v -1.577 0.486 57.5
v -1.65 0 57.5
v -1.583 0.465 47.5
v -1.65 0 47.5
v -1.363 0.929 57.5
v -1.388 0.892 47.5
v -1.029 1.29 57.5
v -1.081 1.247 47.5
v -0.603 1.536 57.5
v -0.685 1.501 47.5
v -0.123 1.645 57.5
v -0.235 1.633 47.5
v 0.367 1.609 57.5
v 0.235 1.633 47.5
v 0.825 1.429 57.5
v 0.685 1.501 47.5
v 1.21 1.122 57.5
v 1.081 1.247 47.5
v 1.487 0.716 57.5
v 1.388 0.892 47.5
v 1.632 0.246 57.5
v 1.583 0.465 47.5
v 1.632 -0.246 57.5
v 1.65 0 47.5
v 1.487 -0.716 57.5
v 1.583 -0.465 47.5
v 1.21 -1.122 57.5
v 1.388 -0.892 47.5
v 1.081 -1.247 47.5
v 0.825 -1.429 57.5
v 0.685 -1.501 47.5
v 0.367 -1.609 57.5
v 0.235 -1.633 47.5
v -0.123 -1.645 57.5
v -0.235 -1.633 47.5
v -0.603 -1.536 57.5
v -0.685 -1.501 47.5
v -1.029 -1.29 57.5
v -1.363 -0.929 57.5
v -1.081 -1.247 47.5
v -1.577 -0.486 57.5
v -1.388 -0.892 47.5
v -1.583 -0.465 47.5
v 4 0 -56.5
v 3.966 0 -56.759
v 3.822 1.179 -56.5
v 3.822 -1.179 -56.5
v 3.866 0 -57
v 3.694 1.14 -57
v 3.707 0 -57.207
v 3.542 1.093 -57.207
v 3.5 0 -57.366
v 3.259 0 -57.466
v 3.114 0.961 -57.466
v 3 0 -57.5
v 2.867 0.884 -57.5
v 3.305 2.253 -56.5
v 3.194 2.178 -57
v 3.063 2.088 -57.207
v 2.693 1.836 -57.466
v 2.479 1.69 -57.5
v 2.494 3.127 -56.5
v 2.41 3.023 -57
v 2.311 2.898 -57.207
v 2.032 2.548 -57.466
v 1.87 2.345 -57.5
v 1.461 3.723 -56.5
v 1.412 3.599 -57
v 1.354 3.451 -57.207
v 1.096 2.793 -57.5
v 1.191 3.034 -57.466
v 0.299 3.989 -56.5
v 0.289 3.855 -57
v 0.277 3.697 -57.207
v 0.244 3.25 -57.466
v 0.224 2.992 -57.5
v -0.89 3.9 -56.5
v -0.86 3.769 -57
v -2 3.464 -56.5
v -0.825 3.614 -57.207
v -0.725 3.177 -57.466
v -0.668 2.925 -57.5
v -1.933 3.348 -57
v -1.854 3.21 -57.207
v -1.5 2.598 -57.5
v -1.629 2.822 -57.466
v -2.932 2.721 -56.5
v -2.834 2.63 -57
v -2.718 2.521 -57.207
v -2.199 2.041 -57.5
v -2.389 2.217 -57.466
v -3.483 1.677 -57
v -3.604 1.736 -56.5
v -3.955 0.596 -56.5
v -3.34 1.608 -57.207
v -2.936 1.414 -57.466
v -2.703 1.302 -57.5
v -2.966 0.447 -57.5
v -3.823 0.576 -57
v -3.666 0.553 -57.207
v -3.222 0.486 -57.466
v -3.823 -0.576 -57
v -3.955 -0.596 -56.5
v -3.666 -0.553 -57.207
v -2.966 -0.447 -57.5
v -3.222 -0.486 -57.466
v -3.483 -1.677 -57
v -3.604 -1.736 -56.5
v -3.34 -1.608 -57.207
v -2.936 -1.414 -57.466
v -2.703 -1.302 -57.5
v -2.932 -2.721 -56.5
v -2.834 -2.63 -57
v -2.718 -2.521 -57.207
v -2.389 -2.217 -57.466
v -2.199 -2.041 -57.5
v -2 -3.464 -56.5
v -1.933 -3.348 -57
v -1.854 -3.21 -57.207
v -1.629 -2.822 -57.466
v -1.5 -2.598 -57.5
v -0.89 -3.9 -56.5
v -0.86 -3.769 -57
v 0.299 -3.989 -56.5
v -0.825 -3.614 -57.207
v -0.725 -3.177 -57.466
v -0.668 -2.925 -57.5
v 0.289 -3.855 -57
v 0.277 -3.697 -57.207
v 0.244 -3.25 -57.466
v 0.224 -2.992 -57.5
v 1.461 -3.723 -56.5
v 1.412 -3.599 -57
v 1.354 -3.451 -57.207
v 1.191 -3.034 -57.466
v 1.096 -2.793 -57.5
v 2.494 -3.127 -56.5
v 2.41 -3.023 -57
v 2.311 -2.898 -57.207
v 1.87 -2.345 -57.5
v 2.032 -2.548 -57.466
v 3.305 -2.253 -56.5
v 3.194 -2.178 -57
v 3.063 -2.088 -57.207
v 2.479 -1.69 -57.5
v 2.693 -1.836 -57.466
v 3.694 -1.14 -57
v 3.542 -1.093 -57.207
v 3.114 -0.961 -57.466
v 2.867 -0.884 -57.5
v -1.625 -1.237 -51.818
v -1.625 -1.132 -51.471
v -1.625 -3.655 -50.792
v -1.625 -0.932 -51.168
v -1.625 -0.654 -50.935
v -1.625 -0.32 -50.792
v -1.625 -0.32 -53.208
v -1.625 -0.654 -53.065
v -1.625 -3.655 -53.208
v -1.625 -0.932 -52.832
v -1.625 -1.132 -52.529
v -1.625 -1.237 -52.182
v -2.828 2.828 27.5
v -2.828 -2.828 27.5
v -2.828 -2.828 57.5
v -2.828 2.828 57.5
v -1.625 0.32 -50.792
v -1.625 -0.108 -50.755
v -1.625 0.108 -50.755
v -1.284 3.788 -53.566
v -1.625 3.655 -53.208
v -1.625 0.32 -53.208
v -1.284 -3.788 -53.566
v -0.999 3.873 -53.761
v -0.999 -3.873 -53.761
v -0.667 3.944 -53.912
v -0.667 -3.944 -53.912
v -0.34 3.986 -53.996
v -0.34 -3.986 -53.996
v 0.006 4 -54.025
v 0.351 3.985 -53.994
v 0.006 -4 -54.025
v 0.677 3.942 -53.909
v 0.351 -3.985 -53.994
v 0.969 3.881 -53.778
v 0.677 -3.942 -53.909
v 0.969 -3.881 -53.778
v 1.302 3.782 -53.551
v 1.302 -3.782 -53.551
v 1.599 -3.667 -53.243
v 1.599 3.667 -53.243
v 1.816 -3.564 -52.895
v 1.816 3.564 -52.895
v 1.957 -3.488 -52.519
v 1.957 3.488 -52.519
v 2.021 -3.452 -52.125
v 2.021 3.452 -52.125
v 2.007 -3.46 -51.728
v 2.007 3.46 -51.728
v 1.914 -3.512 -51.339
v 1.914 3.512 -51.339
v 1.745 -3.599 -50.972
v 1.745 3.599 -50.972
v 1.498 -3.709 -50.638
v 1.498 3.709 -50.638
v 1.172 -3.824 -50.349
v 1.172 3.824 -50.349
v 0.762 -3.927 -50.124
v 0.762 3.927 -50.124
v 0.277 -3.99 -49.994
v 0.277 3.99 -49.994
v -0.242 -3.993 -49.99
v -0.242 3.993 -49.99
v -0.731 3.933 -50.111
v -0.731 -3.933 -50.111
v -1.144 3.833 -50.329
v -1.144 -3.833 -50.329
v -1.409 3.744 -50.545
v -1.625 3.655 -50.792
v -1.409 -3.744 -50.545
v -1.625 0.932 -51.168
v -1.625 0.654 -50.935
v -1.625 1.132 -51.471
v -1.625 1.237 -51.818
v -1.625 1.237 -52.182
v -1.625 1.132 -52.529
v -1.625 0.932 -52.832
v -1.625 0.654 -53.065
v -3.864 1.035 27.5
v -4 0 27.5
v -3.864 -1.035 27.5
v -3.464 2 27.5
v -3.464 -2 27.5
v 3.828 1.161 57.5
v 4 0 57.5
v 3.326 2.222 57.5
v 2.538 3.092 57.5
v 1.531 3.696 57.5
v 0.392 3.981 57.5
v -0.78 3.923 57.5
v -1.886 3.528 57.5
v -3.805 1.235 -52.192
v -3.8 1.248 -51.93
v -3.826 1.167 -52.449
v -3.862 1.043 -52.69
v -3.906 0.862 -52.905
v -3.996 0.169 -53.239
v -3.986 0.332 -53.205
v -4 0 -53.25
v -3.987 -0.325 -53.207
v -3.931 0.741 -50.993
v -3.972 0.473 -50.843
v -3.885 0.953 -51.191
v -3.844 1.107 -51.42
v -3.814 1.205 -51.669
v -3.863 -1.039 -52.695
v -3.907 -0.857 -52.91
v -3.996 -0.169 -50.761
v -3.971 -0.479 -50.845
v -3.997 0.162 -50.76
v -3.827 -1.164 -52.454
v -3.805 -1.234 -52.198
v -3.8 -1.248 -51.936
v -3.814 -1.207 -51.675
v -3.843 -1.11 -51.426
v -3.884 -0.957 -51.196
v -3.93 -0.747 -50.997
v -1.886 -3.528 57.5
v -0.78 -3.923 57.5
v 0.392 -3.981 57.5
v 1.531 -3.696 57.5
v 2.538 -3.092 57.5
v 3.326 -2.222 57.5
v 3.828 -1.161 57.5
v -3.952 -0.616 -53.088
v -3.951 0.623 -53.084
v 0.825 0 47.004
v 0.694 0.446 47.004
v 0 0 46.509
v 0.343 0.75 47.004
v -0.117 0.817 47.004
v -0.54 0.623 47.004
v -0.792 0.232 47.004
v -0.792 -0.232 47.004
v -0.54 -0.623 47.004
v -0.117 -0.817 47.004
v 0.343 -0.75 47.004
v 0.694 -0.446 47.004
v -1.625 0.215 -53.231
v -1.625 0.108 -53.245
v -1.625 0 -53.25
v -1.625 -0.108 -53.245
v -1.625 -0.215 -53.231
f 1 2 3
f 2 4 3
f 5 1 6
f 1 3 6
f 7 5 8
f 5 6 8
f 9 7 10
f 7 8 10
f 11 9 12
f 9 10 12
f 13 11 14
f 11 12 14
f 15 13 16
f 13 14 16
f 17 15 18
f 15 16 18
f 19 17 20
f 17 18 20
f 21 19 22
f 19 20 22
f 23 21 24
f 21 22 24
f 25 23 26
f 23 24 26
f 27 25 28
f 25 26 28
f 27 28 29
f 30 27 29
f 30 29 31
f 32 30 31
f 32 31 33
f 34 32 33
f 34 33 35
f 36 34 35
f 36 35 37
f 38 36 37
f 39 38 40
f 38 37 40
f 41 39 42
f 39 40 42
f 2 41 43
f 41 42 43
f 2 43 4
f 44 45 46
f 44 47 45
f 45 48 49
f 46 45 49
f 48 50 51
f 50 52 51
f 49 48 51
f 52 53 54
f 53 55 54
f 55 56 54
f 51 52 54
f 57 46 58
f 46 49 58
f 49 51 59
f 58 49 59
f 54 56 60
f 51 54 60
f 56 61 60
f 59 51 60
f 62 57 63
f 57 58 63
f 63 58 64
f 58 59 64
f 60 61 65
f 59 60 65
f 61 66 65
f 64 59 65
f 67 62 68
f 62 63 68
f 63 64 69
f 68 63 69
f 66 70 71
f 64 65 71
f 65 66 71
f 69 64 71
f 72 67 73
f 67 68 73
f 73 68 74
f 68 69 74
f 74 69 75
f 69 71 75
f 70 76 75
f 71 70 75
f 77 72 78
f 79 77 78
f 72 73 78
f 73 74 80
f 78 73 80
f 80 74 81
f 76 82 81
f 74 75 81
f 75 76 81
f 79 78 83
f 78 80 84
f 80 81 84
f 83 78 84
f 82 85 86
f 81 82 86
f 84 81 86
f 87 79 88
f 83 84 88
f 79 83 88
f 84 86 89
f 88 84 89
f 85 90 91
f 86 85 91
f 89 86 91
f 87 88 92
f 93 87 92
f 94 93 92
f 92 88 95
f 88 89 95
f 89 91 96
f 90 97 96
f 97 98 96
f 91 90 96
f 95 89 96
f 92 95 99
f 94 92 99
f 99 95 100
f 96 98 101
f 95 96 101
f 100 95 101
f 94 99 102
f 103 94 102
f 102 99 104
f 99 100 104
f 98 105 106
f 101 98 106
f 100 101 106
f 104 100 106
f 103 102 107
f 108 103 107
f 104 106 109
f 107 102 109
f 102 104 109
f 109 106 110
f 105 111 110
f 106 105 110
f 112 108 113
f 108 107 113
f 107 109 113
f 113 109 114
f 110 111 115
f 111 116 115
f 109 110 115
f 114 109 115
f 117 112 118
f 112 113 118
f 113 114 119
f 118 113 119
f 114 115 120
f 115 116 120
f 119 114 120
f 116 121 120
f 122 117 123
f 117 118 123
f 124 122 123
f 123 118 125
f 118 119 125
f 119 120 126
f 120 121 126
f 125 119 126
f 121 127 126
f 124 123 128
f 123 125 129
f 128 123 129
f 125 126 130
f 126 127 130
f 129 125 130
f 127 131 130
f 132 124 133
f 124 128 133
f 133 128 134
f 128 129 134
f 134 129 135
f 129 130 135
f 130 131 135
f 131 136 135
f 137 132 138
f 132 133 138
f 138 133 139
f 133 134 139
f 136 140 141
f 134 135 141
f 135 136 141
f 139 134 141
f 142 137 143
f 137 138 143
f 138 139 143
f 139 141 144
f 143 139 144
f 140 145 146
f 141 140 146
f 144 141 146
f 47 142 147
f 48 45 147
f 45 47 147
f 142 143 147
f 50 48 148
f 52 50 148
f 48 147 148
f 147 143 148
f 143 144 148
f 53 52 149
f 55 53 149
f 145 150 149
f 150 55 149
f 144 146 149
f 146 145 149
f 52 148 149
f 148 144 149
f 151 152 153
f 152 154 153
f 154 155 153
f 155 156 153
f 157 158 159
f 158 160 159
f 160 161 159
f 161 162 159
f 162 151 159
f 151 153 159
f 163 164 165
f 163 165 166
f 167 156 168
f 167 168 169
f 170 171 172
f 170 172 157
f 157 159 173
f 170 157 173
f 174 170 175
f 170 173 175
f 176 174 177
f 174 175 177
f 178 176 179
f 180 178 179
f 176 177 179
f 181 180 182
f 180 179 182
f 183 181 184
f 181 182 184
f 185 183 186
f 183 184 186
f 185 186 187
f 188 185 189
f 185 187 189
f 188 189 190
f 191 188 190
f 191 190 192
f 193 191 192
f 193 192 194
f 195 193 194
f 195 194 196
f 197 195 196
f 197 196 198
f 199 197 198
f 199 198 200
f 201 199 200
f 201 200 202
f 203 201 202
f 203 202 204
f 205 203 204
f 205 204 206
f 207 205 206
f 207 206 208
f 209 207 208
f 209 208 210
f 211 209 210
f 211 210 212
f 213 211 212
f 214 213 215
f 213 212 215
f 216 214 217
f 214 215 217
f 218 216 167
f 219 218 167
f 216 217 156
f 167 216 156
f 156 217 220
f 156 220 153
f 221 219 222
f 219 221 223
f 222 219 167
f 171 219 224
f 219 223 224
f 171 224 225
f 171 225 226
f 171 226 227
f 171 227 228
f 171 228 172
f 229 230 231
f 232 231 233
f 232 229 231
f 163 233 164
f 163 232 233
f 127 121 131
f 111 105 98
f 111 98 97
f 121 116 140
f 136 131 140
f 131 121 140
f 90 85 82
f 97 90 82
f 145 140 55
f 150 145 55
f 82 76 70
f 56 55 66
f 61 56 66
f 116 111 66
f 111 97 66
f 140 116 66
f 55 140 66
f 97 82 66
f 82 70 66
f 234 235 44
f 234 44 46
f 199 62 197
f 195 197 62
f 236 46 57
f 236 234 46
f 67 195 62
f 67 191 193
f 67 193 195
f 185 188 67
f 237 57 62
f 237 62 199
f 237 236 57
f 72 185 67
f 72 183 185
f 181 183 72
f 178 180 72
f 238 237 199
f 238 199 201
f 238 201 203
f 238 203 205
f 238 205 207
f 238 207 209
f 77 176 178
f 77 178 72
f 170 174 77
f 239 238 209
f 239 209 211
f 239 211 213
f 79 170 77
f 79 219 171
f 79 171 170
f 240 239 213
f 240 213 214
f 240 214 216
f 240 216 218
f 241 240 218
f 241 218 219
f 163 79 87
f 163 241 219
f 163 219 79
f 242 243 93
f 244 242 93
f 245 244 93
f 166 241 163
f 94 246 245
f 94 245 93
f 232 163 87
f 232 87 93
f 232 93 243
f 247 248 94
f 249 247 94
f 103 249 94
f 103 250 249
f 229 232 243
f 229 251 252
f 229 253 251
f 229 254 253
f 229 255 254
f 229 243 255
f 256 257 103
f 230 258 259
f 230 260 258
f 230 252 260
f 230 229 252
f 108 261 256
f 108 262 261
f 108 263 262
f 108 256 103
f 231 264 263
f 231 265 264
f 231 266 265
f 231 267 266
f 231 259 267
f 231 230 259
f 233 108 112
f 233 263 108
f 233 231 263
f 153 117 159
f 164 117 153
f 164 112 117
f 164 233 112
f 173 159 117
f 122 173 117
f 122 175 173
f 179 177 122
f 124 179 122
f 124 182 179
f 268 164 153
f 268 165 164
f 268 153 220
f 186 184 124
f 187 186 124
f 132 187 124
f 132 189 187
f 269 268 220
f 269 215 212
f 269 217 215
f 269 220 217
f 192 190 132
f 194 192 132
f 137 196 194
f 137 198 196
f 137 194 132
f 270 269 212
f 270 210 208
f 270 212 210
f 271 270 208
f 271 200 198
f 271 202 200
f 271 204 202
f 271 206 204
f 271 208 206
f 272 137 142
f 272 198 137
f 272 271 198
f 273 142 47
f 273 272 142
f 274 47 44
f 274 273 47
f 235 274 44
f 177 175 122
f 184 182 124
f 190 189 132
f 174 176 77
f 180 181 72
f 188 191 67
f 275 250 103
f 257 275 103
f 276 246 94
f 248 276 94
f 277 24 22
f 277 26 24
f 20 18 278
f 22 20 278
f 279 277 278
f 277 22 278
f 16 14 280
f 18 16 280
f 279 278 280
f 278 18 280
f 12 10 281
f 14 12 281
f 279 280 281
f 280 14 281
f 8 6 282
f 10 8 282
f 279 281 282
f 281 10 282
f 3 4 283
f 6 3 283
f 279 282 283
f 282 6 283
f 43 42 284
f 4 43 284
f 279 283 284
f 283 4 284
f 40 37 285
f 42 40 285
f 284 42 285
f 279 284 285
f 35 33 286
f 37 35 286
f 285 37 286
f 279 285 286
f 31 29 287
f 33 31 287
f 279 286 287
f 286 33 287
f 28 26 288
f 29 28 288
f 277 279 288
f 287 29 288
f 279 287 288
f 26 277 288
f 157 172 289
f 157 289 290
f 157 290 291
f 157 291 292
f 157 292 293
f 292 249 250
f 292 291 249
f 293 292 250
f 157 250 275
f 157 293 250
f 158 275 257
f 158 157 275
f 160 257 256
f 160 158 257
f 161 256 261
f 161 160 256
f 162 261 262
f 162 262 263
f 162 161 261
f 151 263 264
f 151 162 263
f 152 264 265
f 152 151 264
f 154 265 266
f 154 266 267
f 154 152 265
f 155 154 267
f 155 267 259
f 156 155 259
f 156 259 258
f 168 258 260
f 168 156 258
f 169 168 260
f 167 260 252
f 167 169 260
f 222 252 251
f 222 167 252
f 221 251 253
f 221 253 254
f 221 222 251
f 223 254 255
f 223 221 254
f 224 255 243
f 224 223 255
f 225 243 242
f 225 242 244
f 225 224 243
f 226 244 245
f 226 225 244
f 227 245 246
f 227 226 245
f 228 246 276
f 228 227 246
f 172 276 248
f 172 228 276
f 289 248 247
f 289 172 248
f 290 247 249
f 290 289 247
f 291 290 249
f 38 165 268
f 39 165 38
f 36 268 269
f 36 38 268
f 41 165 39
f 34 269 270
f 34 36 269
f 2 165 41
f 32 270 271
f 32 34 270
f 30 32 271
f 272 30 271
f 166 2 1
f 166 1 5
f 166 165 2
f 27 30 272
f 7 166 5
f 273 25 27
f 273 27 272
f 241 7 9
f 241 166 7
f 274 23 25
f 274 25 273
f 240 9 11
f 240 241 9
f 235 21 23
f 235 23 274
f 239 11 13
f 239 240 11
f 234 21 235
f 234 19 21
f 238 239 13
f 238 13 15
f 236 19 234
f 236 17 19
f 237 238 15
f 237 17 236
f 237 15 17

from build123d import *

# Parameters (mm, degrees)
SKETCH_3_R               = 4
EXTRUDE_2_DEPTH          = 57.5
CUT_EXTRUDE_1_DEPTH      = 58.777590812
CUT_EXTRUDE_1_DEPTH_BACK = 58.777590812
FILLET_1_R               = 1
M4X0_7_1_D               = 3.3
M4X0_7_1_DEPTH           = 10
M4X0_7_1_TIP             = 0.991420021
CUT_EXTRUDE_2_DEPTH      = 30


with BuildPart() as part:
    # 草图3 → 凸台-拉伸2 (new, symmetric)
    with BuildSketch(Plane.XY):
        Circle(SKETCH_3_R)
    extrude(amount=EXTRUDE_2_DEPTH, both=True)

    # 草图1 → 切除-拉伸1 (cut, two sides: drawn at the far end of the back side and taken through both)
    with BuildSketch(Plane(origin=(0, 0, 0), x_dir=(1, 0, 0), z_dir=(0, 1, 0)).offset(-CUT_EXTRUDE_1_DEPTH_BACK)):
        with BuildLine():
            Line((-1.625, 50.791695403), (-1.625, 53.208304597))
            ThreePointArc((-1.625, 53.208304597), (2.025, 52), (-1.625, 50.791695403))
        make_face()
    extrude(amount=CUT_EXTRUDE_1_DEPTH + CUT_EXTRUDE_1_DEPTH_BACK, mode=Mode.SUBTRACT)

    # 圆角1
    fillet_1_edges = [part.edges().sort_by_distance(p)[0] for p in [
        (-4, 0, -57.5),
    ]]
    fillet(fillet_1_edges, radius=FILLET_1_R)

    # M4x0.7 螺纹孔1
    with Locations(Plane.XY.offset(57.5)):
        with Locations((0, 0)):
            Hole(M4X0_7_1_D / 2, depth=M4X0_7_1_DEPTH)
            with Locations((0, 0, -(M4X0_7_1_DEPTH + M4X0_7_1_TIP / 2))):  # 118° drill point
                Cone(0, M4X0_7_1_D / 2, M4X0_7_1_TIP, mode=Mode.SUBTRACT)

    # 草图17 → M3x0.5 螺纹孔1 (revolve, cut)
    with BuildSketch(Plane(origin=(-1.625, 0, -52), x_dir=(0, 0, -1), z_dir=(0, 1, 0))):
        Polygon((0, 0), (0, 8.251075774), (1.25, 7.5), (1.25, 0), align=None)
    revolve(axis=Axis((4.725, 0, -52), (-1, 0, 0)), mode=Mode.SUBTRACT)

    # 草图13 → 切除-拉伸2 (cut)
    with BuildSketch(Plane.XY.offset(57.5)):
        with BuildLine():
            ThreePointArc((-2.828427125, 2.828427125), (-4, 0), (-2.828427125, -2.828427125))
            Line((-2.828427125, -2.828427125), (-2.828427125, 2.828427125))
        make_face()
    extrude(amount=-CUT_EXTRUDE_2_DEPTH, mode=Mode.SUBTRACT)


solid = part.part
